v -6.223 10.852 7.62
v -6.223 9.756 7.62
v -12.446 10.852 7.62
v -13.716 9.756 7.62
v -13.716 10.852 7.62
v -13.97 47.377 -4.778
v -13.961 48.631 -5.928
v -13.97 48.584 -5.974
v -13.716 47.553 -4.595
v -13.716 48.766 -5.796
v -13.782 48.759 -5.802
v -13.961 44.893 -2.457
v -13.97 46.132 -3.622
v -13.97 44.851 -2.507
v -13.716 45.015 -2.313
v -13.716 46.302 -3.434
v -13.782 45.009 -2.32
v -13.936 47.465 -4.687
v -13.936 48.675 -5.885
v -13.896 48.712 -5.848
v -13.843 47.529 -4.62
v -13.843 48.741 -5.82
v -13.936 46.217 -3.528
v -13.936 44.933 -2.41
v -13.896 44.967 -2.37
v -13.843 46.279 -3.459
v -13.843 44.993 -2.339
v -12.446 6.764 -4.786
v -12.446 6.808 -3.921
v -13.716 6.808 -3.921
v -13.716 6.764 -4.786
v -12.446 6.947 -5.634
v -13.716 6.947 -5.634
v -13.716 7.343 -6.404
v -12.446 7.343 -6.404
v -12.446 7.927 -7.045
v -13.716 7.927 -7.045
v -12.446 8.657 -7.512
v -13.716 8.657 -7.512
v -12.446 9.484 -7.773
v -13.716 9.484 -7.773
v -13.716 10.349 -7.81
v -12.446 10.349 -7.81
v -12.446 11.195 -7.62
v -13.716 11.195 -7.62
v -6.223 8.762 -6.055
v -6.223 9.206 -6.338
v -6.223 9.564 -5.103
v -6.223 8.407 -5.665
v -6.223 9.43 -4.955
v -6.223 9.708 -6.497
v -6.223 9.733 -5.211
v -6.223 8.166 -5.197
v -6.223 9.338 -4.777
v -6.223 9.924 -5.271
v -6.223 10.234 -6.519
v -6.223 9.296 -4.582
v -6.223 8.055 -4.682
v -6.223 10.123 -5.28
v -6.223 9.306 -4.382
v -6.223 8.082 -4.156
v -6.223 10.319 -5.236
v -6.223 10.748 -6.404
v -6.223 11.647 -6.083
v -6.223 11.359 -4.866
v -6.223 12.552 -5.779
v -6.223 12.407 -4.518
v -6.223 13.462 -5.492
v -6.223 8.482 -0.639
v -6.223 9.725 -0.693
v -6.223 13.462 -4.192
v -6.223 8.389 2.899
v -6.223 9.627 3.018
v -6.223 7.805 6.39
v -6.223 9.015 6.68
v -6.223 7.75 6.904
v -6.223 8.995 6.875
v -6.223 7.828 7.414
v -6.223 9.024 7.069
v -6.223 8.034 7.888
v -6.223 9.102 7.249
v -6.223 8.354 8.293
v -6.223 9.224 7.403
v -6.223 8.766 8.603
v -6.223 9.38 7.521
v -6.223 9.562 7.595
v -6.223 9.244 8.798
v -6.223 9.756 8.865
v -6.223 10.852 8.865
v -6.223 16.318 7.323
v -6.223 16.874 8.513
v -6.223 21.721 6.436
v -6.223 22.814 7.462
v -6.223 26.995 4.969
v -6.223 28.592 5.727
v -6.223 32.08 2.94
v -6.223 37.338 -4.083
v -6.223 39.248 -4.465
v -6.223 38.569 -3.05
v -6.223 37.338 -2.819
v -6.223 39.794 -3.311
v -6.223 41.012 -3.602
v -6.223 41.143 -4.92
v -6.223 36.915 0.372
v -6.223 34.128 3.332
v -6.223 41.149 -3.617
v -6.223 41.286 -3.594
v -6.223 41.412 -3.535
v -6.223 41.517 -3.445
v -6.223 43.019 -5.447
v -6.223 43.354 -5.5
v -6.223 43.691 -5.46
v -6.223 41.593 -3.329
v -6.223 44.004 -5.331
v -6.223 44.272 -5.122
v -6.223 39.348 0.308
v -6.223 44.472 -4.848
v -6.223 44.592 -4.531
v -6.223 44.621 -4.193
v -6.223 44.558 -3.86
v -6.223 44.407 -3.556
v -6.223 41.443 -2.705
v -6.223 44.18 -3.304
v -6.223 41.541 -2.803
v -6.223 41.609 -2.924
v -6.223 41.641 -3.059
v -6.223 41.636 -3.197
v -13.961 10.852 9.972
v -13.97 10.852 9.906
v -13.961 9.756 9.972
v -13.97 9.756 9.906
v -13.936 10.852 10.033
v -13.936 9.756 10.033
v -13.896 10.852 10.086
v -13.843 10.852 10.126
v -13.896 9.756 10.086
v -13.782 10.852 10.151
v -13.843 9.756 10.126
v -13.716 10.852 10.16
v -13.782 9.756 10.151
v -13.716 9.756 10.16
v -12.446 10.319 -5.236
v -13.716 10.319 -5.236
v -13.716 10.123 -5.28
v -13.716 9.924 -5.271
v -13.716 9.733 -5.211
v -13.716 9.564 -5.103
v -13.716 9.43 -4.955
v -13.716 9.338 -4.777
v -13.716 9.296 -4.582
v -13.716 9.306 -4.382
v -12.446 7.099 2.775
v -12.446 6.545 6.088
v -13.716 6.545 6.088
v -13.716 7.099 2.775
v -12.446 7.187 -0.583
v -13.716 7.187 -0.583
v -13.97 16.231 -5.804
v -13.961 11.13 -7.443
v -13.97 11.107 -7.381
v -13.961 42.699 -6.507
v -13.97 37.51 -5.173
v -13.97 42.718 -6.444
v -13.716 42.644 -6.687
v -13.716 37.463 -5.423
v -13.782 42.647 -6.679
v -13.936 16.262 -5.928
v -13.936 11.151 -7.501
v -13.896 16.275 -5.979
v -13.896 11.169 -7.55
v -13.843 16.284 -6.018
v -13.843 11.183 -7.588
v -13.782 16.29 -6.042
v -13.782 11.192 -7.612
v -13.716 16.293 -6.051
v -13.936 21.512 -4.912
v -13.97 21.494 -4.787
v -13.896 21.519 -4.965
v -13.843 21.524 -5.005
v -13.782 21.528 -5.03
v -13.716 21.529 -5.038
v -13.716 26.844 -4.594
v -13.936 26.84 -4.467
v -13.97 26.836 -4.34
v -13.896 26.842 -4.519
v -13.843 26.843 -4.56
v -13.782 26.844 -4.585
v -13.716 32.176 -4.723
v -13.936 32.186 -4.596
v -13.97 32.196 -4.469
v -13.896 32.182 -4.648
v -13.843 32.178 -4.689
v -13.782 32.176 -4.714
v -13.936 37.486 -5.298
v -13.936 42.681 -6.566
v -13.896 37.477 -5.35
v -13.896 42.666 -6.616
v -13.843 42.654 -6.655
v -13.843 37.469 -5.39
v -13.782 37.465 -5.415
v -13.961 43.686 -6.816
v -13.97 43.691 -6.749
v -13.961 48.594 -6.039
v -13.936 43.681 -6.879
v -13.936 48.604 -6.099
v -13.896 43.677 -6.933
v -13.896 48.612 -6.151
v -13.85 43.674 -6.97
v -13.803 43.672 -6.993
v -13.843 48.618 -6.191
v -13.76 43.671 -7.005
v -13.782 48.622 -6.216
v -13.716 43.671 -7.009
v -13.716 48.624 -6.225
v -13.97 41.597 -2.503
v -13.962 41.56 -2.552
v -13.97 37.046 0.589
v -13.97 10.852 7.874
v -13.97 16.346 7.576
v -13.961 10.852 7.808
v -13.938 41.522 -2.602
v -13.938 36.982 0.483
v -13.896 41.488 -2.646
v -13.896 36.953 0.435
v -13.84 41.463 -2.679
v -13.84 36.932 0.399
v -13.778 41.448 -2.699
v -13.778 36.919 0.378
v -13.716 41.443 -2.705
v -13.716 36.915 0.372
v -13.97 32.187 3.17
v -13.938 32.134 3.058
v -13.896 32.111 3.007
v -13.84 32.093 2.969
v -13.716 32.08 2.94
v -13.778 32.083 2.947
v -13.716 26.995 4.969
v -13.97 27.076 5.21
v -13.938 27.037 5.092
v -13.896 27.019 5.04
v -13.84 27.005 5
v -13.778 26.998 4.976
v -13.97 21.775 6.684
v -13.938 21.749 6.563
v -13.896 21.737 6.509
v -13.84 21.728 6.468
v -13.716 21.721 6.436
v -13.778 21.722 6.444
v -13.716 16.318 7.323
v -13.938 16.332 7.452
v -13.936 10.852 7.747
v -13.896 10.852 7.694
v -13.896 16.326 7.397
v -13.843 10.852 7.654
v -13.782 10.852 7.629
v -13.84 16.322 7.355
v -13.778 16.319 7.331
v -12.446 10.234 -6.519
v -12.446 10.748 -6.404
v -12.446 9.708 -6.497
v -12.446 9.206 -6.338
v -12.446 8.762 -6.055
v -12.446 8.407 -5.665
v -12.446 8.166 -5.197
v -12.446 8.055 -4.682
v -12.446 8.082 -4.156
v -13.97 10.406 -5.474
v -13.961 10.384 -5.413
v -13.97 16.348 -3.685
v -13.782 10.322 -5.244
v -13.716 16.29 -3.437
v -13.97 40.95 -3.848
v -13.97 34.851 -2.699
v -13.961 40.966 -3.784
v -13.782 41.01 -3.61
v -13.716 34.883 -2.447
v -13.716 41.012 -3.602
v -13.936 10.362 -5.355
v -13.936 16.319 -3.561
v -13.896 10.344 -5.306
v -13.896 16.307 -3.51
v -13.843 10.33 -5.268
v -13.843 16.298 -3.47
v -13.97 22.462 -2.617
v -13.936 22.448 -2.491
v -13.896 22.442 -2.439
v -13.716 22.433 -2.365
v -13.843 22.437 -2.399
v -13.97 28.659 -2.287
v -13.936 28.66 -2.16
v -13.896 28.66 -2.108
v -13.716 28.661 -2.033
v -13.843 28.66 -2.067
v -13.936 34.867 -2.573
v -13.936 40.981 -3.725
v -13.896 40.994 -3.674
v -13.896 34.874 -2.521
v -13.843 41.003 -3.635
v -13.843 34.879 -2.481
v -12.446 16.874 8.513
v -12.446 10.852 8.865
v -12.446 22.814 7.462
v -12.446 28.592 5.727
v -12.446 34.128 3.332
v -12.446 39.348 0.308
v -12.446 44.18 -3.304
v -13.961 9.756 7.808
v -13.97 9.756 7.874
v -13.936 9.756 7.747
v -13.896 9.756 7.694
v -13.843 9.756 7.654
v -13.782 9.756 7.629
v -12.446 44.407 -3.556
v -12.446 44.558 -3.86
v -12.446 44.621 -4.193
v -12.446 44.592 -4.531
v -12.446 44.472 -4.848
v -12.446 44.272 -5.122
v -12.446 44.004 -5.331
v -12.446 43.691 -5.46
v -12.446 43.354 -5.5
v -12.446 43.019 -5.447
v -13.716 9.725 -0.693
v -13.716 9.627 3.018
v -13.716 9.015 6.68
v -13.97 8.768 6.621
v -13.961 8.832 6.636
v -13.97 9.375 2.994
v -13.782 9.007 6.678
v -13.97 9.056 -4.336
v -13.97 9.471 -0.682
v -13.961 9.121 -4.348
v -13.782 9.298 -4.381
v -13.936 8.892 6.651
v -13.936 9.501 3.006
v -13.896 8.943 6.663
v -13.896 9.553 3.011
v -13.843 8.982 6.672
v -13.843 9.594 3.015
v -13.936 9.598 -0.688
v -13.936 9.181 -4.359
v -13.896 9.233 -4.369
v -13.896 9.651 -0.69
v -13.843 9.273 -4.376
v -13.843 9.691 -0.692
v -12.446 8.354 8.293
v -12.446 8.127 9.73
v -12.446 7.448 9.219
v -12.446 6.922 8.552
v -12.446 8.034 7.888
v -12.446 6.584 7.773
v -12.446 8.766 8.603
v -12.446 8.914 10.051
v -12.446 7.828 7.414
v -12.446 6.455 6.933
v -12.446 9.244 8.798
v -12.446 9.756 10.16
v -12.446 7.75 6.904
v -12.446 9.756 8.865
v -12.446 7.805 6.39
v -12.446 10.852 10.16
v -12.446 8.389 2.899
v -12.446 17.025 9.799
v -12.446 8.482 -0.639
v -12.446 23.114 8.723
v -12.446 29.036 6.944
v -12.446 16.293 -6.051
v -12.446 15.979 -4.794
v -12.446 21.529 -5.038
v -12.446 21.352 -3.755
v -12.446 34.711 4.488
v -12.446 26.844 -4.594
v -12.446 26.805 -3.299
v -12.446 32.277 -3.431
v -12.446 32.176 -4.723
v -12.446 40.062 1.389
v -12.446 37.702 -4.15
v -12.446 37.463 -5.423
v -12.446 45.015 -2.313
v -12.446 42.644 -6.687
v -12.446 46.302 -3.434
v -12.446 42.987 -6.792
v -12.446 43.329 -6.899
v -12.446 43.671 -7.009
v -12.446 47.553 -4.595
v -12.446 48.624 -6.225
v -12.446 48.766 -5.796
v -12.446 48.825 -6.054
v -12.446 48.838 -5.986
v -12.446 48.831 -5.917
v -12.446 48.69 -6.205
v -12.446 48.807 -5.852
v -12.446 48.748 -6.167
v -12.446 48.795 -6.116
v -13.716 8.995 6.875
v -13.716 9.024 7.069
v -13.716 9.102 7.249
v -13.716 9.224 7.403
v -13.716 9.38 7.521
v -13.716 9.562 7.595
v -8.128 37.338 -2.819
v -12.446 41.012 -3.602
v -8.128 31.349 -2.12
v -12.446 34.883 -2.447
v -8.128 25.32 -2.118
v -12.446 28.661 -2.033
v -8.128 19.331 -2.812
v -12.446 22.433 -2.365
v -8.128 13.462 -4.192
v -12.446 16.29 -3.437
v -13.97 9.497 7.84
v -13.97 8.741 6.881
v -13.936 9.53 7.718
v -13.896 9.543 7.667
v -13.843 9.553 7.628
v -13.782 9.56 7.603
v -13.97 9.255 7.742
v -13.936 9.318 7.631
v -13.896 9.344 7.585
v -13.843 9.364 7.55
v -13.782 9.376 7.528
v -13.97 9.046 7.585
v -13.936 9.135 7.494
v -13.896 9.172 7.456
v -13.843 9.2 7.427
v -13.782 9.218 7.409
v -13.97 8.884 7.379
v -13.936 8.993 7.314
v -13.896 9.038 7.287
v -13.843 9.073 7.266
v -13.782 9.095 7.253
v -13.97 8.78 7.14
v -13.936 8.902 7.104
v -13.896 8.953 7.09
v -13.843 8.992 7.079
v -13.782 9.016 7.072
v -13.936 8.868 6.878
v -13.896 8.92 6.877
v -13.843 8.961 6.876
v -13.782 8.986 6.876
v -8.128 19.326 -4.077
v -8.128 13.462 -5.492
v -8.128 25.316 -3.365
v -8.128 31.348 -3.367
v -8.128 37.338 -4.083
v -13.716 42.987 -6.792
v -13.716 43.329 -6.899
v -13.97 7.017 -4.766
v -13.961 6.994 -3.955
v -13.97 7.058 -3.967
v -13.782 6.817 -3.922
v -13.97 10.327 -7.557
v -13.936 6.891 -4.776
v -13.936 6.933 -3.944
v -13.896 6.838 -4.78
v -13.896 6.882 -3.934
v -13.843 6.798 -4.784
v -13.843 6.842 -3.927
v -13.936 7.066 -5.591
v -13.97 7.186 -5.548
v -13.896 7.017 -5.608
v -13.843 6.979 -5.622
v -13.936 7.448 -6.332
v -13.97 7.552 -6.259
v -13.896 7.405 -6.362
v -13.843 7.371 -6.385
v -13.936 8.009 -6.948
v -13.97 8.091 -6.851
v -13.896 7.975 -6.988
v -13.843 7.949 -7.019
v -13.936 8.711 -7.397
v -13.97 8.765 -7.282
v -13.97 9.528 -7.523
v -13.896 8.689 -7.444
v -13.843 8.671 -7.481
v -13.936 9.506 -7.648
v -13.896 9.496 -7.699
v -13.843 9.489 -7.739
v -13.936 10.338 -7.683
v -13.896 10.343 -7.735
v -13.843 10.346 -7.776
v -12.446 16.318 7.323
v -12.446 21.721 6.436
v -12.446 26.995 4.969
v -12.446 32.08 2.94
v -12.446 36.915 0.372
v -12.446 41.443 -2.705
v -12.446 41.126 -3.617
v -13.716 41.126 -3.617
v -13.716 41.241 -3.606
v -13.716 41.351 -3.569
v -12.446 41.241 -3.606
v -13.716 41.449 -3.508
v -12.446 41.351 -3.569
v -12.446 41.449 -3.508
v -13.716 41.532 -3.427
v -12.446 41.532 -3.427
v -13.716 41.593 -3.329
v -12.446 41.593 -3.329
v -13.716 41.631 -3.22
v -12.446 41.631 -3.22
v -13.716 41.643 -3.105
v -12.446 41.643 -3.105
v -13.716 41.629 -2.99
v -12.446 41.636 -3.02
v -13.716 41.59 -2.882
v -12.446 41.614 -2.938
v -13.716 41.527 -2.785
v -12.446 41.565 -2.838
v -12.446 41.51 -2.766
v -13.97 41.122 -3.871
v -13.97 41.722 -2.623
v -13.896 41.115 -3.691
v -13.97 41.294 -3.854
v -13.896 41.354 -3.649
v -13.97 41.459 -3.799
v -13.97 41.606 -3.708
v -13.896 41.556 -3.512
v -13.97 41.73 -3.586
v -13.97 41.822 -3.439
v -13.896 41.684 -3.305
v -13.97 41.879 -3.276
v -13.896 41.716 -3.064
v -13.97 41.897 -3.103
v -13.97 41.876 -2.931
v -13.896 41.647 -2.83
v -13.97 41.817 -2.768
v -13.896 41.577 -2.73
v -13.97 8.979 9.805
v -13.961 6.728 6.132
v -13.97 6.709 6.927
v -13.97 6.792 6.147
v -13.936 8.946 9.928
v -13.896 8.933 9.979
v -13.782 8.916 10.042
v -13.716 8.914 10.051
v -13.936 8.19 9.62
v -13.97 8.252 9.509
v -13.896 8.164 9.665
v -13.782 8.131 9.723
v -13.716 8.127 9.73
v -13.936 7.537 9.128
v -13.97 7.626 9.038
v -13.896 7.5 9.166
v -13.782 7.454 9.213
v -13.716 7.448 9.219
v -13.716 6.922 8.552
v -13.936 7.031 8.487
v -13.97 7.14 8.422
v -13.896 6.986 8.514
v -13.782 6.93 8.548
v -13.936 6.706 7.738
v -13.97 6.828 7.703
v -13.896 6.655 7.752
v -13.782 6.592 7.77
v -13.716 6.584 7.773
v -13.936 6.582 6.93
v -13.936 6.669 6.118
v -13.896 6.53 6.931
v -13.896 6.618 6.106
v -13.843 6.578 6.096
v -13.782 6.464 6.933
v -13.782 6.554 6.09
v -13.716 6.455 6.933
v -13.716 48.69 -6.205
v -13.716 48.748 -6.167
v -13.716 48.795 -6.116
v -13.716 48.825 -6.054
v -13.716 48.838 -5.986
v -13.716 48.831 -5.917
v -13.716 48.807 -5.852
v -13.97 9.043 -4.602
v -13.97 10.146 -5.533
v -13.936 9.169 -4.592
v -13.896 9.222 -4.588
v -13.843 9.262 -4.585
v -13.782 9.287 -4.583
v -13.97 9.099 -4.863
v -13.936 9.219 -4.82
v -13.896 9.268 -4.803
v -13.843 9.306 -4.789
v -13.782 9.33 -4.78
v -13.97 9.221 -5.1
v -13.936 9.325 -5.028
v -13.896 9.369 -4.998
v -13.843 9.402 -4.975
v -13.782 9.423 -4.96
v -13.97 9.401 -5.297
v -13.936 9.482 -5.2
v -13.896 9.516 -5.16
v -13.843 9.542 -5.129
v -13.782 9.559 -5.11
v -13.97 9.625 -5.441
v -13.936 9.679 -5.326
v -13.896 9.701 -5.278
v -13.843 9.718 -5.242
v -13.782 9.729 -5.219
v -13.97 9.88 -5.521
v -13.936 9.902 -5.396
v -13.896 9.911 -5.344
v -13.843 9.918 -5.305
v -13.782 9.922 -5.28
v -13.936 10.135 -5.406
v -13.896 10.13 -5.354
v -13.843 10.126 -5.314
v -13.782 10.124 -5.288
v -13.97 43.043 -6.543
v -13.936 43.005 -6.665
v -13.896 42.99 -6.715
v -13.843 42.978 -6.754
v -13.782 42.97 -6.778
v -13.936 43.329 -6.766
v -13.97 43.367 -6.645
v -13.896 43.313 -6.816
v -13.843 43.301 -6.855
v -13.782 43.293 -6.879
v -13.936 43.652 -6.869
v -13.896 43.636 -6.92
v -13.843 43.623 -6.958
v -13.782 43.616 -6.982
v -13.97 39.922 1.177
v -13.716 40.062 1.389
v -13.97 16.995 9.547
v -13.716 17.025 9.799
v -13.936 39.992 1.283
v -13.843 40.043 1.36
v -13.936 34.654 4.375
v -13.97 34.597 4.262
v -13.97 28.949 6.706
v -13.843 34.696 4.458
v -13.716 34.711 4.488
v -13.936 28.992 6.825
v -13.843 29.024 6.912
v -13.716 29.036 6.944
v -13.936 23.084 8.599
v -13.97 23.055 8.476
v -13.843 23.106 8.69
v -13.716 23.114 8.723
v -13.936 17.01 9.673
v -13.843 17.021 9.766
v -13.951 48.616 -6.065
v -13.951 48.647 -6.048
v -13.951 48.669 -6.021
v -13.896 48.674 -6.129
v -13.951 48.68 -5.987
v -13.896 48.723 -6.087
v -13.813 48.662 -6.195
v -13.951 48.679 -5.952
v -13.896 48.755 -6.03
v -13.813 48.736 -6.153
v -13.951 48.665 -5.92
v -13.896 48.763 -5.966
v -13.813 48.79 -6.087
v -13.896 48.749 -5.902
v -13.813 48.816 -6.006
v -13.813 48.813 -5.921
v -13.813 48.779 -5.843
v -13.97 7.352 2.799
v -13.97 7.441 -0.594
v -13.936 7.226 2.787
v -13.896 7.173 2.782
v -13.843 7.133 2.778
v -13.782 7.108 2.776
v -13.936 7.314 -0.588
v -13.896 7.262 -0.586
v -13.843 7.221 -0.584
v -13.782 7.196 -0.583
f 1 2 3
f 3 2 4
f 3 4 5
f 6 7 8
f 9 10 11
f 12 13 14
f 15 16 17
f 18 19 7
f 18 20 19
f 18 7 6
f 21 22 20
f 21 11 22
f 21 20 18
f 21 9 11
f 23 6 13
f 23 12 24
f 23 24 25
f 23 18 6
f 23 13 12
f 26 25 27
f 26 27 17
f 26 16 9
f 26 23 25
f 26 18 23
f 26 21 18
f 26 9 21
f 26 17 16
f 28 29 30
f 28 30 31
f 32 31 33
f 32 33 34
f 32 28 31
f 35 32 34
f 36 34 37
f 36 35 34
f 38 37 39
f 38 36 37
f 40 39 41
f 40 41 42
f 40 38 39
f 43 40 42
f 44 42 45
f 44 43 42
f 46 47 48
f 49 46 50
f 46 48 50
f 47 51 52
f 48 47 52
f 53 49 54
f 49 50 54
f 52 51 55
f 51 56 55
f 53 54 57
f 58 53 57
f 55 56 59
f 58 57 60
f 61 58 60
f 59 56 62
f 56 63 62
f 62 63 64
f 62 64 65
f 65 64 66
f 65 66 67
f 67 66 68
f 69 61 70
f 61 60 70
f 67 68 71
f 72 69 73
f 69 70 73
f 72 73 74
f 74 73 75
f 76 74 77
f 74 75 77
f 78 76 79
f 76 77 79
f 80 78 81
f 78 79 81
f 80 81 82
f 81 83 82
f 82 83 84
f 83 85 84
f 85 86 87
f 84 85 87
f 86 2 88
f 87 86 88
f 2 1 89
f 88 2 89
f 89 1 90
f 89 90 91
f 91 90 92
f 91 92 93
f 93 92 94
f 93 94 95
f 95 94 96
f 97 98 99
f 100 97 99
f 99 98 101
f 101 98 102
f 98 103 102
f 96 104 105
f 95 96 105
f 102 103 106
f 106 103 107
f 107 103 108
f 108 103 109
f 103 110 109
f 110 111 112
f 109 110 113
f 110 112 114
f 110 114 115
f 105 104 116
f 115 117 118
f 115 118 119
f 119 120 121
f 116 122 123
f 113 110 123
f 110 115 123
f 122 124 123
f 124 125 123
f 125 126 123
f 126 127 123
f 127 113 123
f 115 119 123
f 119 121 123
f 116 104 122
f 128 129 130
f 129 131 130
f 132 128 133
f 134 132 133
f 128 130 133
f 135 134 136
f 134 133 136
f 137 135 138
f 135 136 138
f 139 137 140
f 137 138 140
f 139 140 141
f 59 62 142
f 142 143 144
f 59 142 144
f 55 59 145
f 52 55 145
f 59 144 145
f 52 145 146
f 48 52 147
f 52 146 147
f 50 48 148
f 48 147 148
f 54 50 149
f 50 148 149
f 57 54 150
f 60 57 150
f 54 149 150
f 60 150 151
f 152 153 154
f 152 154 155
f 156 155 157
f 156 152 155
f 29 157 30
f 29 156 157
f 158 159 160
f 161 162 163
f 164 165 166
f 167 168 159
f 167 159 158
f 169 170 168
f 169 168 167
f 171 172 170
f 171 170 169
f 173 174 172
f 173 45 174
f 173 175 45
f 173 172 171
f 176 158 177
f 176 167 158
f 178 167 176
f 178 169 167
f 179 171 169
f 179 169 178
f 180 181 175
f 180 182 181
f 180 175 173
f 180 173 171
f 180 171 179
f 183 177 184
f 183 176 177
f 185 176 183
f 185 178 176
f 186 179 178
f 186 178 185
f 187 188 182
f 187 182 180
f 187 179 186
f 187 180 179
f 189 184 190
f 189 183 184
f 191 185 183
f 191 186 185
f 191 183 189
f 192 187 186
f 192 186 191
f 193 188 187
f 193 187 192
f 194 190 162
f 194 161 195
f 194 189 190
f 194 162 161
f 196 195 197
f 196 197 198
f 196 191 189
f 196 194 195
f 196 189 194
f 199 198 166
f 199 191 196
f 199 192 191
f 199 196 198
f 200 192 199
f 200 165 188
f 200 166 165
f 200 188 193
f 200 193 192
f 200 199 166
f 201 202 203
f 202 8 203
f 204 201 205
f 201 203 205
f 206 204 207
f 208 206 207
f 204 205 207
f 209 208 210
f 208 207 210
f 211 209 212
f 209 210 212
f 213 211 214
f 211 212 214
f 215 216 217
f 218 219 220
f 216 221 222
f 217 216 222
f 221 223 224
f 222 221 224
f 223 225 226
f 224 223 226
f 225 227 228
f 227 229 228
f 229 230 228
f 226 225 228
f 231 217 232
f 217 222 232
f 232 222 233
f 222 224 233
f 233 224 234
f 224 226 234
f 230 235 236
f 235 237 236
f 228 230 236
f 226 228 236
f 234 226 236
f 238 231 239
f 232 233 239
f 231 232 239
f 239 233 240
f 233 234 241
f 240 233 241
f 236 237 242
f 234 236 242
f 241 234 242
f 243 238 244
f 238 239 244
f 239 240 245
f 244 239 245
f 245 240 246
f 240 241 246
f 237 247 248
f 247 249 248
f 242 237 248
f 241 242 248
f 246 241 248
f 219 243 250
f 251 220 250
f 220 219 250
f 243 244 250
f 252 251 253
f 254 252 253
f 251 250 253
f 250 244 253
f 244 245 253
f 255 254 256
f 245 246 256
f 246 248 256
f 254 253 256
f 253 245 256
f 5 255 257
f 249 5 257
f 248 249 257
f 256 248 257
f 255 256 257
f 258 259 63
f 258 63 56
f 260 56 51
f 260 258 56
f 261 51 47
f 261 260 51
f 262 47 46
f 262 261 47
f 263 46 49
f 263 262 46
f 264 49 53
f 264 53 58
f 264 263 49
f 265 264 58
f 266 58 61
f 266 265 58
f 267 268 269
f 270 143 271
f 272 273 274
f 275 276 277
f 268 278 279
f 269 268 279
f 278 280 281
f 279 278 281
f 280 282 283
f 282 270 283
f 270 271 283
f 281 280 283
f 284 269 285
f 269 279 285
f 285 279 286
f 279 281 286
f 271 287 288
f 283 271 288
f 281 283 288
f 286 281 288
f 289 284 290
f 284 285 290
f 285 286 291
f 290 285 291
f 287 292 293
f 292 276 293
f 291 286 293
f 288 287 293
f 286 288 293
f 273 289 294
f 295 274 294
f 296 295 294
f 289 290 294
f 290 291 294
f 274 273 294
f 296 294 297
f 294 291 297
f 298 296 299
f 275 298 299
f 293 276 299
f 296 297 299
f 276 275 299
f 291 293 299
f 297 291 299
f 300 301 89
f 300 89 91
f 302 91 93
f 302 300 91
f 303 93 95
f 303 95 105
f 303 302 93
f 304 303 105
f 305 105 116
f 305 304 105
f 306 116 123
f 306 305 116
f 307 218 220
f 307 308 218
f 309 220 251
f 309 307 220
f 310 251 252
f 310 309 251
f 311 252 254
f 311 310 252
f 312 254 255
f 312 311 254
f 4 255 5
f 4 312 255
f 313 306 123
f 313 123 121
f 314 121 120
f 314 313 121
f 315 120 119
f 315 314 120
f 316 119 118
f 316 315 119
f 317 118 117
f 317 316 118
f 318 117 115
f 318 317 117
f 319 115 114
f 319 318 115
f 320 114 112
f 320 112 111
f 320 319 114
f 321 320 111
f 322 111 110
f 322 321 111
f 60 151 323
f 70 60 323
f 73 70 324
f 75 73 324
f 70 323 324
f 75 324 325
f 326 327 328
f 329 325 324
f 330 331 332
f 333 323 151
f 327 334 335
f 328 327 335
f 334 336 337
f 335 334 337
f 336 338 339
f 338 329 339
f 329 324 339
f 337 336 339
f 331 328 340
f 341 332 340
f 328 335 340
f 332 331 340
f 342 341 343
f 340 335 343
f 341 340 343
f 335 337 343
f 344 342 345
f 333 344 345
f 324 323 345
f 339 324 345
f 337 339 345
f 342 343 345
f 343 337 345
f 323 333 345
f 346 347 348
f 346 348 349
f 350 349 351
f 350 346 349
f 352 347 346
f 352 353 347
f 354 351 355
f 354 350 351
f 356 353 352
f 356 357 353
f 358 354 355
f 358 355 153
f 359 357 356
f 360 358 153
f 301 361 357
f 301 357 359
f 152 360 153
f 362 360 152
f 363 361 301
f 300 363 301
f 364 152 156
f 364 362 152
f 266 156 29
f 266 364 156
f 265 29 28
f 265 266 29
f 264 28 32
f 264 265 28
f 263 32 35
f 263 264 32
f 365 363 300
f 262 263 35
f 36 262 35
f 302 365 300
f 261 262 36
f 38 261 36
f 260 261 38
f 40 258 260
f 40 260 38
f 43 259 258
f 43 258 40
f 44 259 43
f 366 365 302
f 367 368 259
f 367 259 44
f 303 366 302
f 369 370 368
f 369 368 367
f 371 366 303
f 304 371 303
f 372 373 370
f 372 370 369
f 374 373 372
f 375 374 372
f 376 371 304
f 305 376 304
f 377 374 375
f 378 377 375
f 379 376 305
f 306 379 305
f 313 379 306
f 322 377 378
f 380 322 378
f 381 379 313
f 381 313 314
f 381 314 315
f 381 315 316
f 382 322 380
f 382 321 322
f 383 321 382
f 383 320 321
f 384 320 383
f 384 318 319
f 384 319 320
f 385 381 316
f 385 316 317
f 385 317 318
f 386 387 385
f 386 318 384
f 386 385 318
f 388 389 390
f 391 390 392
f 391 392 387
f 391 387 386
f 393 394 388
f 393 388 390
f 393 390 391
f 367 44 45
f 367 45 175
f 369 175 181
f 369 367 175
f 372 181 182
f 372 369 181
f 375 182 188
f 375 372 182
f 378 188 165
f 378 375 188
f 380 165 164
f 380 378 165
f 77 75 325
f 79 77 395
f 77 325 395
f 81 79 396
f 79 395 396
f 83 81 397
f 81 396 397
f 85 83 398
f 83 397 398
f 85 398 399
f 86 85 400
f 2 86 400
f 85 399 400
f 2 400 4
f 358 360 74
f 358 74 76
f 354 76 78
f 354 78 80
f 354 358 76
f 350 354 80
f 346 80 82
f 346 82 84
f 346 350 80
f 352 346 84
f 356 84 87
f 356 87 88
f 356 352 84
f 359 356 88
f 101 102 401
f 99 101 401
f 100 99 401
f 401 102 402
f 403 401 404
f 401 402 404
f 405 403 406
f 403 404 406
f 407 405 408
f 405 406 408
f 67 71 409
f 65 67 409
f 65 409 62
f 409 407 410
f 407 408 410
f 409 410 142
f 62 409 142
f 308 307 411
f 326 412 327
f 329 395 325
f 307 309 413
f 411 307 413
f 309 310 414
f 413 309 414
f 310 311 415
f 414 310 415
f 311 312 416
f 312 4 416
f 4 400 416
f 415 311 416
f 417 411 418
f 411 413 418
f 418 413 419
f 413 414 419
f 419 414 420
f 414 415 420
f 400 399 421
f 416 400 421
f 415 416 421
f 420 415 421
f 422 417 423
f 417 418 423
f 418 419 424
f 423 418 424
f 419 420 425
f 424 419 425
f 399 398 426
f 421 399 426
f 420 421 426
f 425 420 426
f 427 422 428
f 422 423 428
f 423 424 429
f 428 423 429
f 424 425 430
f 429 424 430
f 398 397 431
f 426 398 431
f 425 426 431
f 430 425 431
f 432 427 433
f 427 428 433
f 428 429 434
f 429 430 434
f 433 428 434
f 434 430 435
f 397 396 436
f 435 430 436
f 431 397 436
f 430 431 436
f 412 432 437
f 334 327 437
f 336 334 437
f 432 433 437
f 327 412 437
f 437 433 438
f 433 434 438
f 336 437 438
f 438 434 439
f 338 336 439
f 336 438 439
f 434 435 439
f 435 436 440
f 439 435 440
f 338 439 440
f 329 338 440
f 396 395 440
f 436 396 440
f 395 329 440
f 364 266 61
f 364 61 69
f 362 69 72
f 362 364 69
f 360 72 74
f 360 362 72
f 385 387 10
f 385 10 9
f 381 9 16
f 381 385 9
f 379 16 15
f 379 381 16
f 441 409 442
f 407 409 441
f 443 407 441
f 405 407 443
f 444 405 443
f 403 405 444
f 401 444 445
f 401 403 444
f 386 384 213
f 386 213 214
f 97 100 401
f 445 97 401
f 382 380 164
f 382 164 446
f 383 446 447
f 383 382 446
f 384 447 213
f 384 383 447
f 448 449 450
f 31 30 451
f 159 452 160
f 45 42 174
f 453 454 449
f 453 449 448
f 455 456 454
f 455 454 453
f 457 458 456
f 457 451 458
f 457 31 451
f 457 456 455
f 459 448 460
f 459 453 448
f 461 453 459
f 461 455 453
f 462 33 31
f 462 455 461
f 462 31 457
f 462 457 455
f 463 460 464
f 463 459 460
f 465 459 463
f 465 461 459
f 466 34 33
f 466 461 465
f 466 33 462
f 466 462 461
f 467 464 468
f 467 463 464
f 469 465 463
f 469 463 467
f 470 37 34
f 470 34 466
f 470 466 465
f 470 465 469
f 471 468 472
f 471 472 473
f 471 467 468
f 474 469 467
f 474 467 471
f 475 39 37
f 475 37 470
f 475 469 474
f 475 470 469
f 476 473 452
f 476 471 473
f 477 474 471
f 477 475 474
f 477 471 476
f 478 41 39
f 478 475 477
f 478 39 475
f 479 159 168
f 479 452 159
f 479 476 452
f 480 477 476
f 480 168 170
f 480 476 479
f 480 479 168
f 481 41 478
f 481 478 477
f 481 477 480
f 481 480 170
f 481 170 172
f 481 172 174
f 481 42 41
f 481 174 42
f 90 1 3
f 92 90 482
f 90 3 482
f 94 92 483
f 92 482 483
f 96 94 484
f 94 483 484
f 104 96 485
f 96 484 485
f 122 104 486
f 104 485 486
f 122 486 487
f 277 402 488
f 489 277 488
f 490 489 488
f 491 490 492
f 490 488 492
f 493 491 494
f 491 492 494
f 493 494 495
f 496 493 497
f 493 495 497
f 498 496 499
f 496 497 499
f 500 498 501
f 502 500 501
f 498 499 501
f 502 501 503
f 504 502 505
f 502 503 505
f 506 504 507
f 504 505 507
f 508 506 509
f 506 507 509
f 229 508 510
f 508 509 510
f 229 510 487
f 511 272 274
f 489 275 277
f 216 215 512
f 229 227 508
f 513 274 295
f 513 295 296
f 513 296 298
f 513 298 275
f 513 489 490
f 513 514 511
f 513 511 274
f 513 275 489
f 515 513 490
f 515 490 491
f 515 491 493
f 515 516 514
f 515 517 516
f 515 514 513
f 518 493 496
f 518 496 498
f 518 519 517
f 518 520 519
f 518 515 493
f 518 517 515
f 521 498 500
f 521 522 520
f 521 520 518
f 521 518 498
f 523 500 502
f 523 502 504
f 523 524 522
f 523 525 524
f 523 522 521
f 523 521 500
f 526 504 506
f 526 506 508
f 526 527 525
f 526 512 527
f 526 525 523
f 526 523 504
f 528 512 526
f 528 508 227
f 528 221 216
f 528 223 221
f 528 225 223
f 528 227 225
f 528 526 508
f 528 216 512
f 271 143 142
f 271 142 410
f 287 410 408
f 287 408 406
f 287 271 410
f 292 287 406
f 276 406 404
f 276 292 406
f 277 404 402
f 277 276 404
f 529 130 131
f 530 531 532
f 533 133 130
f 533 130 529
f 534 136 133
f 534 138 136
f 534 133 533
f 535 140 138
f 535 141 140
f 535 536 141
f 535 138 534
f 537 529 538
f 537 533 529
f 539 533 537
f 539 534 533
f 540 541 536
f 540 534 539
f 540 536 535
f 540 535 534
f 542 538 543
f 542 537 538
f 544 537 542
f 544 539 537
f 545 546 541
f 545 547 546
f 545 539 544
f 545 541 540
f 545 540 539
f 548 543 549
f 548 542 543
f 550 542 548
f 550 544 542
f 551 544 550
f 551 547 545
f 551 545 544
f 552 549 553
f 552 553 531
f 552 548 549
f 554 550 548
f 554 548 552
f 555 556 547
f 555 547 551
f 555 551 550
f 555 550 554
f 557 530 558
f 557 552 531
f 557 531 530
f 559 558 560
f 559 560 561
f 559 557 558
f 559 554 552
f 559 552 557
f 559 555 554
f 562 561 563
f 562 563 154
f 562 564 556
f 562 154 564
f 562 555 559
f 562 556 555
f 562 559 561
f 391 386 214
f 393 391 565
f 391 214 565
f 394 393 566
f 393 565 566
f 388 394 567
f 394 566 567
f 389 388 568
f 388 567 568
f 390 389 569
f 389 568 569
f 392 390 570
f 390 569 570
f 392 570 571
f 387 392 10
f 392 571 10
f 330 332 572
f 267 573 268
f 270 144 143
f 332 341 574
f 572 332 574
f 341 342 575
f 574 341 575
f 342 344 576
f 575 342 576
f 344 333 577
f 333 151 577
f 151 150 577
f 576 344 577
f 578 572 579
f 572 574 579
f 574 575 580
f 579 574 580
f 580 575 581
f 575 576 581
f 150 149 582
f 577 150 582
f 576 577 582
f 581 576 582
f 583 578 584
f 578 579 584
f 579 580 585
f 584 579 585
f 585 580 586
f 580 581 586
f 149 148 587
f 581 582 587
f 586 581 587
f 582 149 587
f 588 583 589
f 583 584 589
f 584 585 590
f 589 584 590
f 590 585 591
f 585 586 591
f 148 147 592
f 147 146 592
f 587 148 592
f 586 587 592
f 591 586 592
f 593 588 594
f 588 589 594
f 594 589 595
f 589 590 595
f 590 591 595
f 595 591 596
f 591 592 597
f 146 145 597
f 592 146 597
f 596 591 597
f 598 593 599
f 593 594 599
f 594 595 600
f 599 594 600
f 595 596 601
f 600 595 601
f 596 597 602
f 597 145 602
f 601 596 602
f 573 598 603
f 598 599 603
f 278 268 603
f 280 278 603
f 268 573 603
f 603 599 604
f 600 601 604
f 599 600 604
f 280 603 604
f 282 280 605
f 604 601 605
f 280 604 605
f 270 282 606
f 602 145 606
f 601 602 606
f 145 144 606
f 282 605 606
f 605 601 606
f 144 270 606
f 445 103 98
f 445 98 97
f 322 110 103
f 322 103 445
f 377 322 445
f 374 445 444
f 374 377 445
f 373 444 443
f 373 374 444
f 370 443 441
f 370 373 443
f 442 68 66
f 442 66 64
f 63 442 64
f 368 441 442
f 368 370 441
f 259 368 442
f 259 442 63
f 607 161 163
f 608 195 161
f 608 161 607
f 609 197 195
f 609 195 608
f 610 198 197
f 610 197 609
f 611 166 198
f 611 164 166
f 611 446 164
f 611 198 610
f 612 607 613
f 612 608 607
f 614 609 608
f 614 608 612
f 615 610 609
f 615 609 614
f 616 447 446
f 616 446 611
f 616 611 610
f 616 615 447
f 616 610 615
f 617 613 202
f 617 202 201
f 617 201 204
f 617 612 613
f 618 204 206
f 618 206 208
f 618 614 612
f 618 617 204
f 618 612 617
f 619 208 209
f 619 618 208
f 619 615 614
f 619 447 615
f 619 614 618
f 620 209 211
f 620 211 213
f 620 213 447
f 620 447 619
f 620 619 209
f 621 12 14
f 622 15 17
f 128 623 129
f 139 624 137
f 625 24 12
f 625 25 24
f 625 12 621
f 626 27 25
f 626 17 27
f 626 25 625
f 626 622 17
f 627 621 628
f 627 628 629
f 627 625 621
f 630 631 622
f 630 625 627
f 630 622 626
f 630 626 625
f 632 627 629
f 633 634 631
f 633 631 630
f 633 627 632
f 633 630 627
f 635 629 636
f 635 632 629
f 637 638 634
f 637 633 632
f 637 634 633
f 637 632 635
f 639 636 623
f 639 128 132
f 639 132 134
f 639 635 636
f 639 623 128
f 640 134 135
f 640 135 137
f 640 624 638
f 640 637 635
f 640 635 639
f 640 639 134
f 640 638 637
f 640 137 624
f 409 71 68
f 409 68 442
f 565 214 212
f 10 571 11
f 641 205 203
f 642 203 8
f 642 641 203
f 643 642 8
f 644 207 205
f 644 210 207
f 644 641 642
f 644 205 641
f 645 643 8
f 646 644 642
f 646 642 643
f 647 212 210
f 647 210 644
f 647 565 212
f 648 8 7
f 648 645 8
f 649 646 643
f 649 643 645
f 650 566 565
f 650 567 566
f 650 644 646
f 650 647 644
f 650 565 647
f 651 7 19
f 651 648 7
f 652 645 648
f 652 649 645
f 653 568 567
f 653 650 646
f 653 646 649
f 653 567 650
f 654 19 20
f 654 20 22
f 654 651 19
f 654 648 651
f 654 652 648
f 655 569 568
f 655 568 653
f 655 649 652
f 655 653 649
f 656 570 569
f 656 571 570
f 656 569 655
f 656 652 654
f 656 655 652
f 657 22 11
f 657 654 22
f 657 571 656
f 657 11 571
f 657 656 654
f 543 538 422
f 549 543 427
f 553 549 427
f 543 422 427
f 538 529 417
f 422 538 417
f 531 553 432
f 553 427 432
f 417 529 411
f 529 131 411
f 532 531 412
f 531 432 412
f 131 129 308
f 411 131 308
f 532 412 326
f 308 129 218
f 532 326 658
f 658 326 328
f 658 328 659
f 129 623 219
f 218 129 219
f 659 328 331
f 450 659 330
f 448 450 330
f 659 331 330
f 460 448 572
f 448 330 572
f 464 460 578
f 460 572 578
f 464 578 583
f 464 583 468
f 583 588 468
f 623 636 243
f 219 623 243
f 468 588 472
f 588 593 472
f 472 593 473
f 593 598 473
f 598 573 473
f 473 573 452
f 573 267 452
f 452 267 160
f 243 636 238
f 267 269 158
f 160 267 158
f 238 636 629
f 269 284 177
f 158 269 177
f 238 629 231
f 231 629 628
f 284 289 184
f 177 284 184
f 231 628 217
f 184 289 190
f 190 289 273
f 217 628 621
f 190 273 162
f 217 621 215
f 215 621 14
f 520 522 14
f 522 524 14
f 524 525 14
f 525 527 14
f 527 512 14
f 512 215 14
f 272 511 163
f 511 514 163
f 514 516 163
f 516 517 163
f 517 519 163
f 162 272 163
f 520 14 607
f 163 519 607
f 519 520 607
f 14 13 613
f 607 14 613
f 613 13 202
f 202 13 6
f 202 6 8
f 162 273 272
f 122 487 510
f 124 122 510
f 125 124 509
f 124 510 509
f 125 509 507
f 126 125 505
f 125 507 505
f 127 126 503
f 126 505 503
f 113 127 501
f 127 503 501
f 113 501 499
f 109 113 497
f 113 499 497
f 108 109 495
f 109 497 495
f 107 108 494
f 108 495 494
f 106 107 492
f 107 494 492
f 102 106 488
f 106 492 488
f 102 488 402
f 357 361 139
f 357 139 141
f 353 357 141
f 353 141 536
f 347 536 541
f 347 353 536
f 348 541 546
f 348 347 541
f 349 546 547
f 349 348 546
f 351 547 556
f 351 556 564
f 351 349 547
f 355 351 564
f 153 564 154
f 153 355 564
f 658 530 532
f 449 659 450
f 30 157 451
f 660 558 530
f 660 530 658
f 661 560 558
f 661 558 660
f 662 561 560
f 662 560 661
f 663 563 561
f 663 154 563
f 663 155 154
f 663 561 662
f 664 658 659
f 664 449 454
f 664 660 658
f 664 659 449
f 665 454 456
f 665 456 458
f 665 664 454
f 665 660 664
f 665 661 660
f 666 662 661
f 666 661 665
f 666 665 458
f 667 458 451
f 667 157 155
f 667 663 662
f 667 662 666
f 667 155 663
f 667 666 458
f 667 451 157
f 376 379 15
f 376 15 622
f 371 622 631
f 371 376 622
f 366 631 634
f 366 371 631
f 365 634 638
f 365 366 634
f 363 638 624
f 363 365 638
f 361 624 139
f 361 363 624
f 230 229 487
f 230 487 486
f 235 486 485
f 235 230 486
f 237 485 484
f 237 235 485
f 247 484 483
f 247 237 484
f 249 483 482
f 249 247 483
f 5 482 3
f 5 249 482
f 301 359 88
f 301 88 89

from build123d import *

# Parameters (mm, degrees)
BOSS_EXTRUDE1_DEPTH = 1.524
CUT_EXTRUDE1_DEPTH  = 1.524
FILLET1_R           = 0.508
BOSS_EXTRUDE2_DEPTH = 6.223
BOSS_EXTRUDE3_START = -1.524
BOSS_EXTRUDE3_DEPTH = 1.524
CUT_EXTRUDE2_START  = -6.223
CUT_EXTRUDE2_DEPTH  = 6.223
FILLET2_R           = 0.254
SKETCH9_W           = 1.905
SKETCH9_H           = 23.876
CUT_EXTRUDE4_DEPTH  = 51.542276073
FILLET3_R           = 0.254


with BuildPart() as part:
    # Sketch2 → Boss-Extrude1 (new body)
    with BuildSketch(Plane(origin=(0, 0, 0), x_dir=(0, 0, -1), z_dir=(1, 0, 0))):
        with BuildLine():
            Line((-10.16, 10.851579944), (-10.16, 9.756379827))
            ThreePointArc((-10.16, 9.756379827), (-8.902698353, 7.16361824), (-6.088278228, 6.54534691))
            ThreePointArc((-6.088278228, 6.54534691), (-1.097578785, 7.201770952), (3.920718614, 6.808496661))
            ThreePointArc((3.920718614, 6.808496661), (7.044965017, 7.926917254), (7.619757818, 11.195157369))
            ThreePointArc((7.619757818, 11.195157369), (4.593793799, 26.843864795), (6.687175028, 42.644379261))
            ThreePointArc((6.687175028, 42.644379261), (5.465660141, 45.611386582), (2.312998216, 45.014767901))
            ThreePointArc((2.312998216, 45.014767901), (-6.944233805, 29.036045126), (-10.16, 10.851579944))
        make_face()
    extrude(amount=BOSS_EXTRUDE1_DEPTH)

    # Sketch3 → Cut-Extrude1 (cut)
    with BuildSketch(Plane(origin=(1.524, 0, 0), x_dir=(0, 0, -1), z_dir=(1, 0, 0))):
        with BuildLine():
            Line((-7.62, 10.851579944), (-7.62, 9.756379827))
            ThreePointArc((-7.62, 9.756379827), (-7.329853466, 9.15805023), (-6.680371899, 9.015372231))
            ThreePointArc((-6.680371899, 9.015372231), (-1.164335672, 9.74089354), (4.382203558, 9.306221955))
            ThreePointArc((4.382203558, 9.306221955), (5.103183497, 9.564319015), (5.23582799, 10.318528273))
            ThreePointArc((5.23582799, 10.318528273), (2.05490982, 26.768577734), (4.25548932, 43.378207999))
            ThreePointArc((4.25548932, 43.378207999), (-4.558282485, 28.164933022), (-7.62, 10.851579944))
        make_face()
    extrude(amount=-CUT_EXTRUDE1_DEPTH, mode=Mode.SUBTRACT)

    # Fillet1
    fillet1_edges = [part.edges().sort_by_distance(p)[0] for p in [
        (0.762, 43.378207999, -4.25548932),
    ]]
    fillet(fillet1_edges, radius=FILLET1_R)

    # Sketch4 → Boss-Extrude2 (add)
    with BuildSketch(Plane.ZY):
        with BuildLine():
            Line((8.89, 9.756379827), (8.89, 10.851579944))
            ThreePointArc((8.89, 10.851579944), (5.751258145, 28.600489074), (-3.284243768, 44.19648795))
            ThreePointArc((-3.284243768, 44.19648795), (-4.86057473, 44.49479729), (-5.471332174, 43.01129363))
            ThreePointArc((-5.471332174, 43.01129363), (-3.32435181, 26.806221264), (-6.427792904, 10.756842821))
            ThreePointArc((-6.427792904, 10.756842821), (-6.074074257, 8.745618135), (-4.151461086, 8.057359308))
            ThreePointArc((-4.151461086, 8.057359308), (1.130957229, 8.471332246), (6.384325063, 7.78035957))
            ThreePointArc((6.384325063, 7.78035957), (8.116275909, 8.160834235), (8.89, 9.756379827))
        make_face()
        with BuildLine():
            Line((7.62, 9.756379827), (7.62, 10.851579944))
            ThreePointArc((7.62, 10.851579944), (4.96917921, 26.995100943), (-2.704895567, 41.443239142))
            ThreePointArc((-2.704895567, 41.443239142), (-3.329273356, 41.593156599), (-3.601704042, 41.011689155))
            ThreePointArc((-3.601704042, 41.011689155), (-2.10574247, 25.541961828), (-5.23582799, 10.318528273))
            ThreePointArc((-5.23582799, 10.318528273), (-5.103183497, 9.564319015), (-4.382203558, 9.306221955))
            ThreePointArc((-4.382203558, 9.306221955), (1.164335672, 9.74089354), (6.680371899, 9.015372231))
            ThreePointArc((6.680371899, 9.015372231), (7.329853466, 9.15805023), (7.62, 9.756379827))
        make_face(mode=Mode.SUBTRACT)
    extrude(amount=BOSS_EXTRUDE2_DEPTH)

    # Sketch5 → Boss-Extrude3 (add)
    with BuildSketch(Plane(origin=(1.524, 0, 0), x_dir=(0, 0, -1), z_dir=(1, 0, 0)).offset(BOSS_EXTRUDE3_START)):
        with BuildLine():
            Line((7.009110806, 43.67080126), (6.148171078, 49.106560771))
            ThreePointArc((6.148171078, 49.106560771), (3.588810081, 46.474083877), (1.217761815, 43.67080126))
            Line((1.217761815, 43.67080126), (6.534669415, 42.12894069))
            ThreePointArc((6.534669415, 42.12894069), (6.765621389, 42.901799905), (7.009110806, 43.67080126))
        make_face()
    extrude(amount=BOSS_EXTRUDE3_DEPTH)

    # Sketch6 → Cut-Extrude2 (cut)
    with BuildSketch(Plane.ZY.offset(6.223).offset(CUT_EXTRUDE2_START)):
        with BuildLine():
            Line((8.89, 9.756379827), (8.89, 10.851579944))
            ThreePointArc((8.89, 10.851579944), (5.751258145, 28.600489074), (-3.284243768, 44.19648795))
            ThreePointArc((-3.284243768, 44.19648795), (-4.86057473, 44.49479729), (-5.471332174, 43.01129363))
            ThreePointArc((-5.471332174, 43.01129363), (-3.32435181, 26.806221264), (-6.427792904, 10.756842821))
            ThreePointArc((-6.427792904, 10.756842821), (-6.074074257, 8.745618135), (-4.151461086, 8.057359308))
            ThreePointArc((-4.151461086, 8.057359308), (1.130957229, 8.471332246), (6.384325063, 7.78035957))
            ThreePointArc((6.384325063, 7.78035957), (8.116275909, 8.160834235), (8.89, 9.756379827))
        make_face()
        with BuildLine():
            Line((8.8646, 9.756379827), (8.8646, 10.851579944))
            ThreePointArc((8.8646, 10.851579944), (5.727398631, 28.591777953), (-3.303668679, 44.180122351))
            ThreePointArc((-3.303668679, 44.180122351), (-4.848473022, 44.472465504), (-5.447015317, 43.018631917))
            ThreePointArc((-5.447015317, 43.018631917), (-3.29896297, 26.805468394), (-6.403953606, 10.74807653))
            ThreePointArc((-6.403953606, 10.74807653), (-6.054656442, 8.761992152), (-4.156075935, 8.082336561))
            ThreePointArc((-4.156075935, 8.082336561), (1.131624798, 8.496723472), (6.390246, 7.805059824))
            ThreePointArc((6.390246, 7.805059824), (8.100547461, 8.180778555), (8.8646, 9.756379827))
        make_face(mode=Mode.SUBTRACT)
    extrude(amount=CUT_EXTRUDE2_DEPTH, mode=Mode.SUBTRACT)

    # Fillet2
    fillet2_edges = [part.edges().sort_by_distance(p)[0] for p in [
        (0.762, 49.106560771, -6.148171078),
    ]]
    fillet(fillet2_edges, radius=FILLET2_R)

    # Sketch9 → Cut-Extrude4 (cut, through all)
    with BuildSketch(Plane.XY.offset(-1.27)):
        with Locations((-5.2705, 25.4)):
            Rectangle(SKETCH9_W, SKETCH9_H)
    extrude(amount=-CUT_EXTRUDE4_DEPTH, mode=Mode.SUBTRACT)

    # Fillet3
    fillet3_edges = [part.edges().sort_by_distance(p)[0] for p in [
        (1.524, 10.303979886, 10.16),
        (1.524, 31.419004876, 6.008417097),
        (1.524, 48.825128825, -6.053623792),
        (1.524, 7.16361824, 8.902698353),
        (1.524, 7.201770952, 1.097578785),
        (1.524, 7.926917254, -7.044965017),
        (1.524, 10.303979886, 7.62),
        (1.524, 9.15805023, 7.329853466),
        (1.524, 9.74089354, 1.164335672),
        (1.524, 9.564319015, -5.103183497),
        (1.524, 25.541961828, -2.10574247),
        (1.524, 27.381577524, -4.580766254),
        (1.524, 26.995100943, 4.96917921),
        (1.524, 41.593156599, -3.329273357),
        (1.524, 46.147271822, -6.616876402),
    ]]
    fillet(fillet3_edges, radius=FILLET3_R)


with BuildPart() as body_2:
    # Mirror2: mirrored copy
    add(part.part.mirror(Plane(origin=(-6.223, 10.851579944, -42.8625), x_dir=(0, 0, 1), z_dir=(-1, 0, 0))))


solid = body_2.part
